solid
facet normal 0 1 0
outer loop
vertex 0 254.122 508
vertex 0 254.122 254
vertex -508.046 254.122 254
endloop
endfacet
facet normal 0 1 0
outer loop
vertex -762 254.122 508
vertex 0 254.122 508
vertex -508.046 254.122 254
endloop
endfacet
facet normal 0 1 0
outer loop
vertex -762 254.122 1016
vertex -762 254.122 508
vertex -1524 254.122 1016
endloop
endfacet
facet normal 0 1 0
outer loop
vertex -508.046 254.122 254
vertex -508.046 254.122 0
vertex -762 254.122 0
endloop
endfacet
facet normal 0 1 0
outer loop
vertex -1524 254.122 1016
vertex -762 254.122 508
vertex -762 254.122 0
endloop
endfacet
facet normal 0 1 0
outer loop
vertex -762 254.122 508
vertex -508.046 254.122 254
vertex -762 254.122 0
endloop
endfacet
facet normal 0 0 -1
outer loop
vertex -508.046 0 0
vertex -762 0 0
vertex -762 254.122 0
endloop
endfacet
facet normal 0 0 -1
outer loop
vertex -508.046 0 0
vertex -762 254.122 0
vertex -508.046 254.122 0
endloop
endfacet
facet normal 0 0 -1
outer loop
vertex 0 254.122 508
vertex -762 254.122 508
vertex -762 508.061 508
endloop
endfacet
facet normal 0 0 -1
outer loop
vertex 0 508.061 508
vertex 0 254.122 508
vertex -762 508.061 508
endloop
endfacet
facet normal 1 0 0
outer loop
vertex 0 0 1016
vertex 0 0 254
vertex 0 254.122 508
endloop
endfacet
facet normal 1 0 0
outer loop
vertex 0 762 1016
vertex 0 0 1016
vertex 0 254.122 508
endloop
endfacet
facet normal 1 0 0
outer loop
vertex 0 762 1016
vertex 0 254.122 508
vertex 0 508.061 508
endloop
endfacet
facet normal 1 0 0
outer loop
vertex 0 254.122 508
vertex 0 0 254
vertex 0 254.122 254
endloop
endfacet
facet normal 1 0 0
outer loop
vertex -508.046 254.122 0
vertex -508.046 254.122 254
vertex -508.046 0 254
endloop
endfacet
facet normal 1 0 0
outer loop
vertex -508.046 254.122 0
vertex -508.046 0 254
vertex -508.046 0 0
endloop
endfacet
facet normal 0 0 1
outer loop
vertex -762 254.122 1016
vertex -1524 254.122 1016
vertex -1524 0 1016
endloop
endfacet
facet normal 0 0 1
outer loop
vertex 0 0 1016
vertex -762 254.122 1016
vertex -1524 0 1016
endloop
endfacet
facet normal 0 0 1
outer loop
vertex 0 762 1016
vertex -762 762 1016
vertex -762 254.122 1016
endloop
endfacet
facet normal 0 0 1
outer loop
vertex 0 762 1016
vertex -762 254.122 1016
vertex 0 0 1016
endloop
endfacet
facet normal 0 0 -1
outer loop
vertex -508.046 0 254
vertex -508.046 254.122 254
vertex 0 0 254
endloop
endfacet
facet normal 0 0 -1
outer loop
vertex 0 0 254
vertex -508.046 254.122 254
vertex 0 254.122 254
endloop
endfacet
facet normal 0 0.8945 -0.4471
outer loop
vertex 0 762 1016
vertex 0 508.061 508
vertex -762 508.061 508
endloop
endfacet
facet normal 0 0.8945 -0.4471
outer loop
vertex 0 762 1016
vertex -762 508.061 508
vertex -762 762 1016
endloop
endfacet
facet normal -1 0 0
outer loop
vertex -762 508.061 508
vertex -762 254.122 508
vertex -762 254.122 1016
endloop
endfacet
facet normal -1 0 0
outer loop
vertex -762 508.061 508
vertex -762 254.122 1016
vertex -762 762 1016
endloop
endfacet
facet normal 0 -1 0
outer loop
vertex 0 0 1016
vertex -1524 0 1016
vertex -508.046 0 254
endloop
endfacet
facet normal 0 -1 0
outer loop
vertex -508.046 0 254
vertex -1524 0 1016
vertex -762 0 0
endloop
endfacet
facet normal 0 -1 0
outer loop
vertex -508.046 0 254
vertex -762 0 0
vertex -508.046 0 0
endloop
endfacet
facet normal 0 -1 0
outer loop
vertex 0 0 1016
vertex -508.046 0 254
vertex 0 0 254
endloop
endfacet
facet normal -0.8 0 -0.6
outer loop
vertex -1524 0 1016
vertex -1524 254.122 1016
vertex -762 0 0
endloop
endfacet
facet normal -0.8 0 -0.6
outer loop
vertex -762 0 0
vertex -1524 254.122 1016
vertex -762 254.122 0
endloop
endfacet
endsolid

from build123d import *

# Parameters (mm, degrees)
SKETCH1_W           = 1524
SKETCH1_H           = 762
BOSS_EXTRUDE1_DEPTH = 1016
SKETCH3_W           = 762
SKETCH3_H           = 507.878356785
CUT_EXTRUDE1_DEPTH  = 1016
CUT_EXTRUDE2_DEPTH  = 260.604
SKETCH6_W           = 254
SKETCH6_H           = 507.878356785
CUT_EXTRUDE3_DEPTH  = 1081.278
SKETCH7_W           = 254
SKETCH7_H           = 508
CUT_EXTRUDE4_DEPTH  = 1081.278
SKETCH8_W           = 508.045957887
SKETCH8_H           = 254
CUT_EXTRUDE5_DEPTH  = 1081.278
CUT_EXTRUDE6_DEPTH  = 835.406


with BuildPart() as part:
    # Sketch1 → Boss-Extrude1 (new body)
    with BuildSketch(Plane.XY):
        with Locations((-762, 381)):
            Rectangle(SKETCH1_W, SKETCH1_H)
    extrude(amount=BOSS_EXTRUDE1_DEPTH)

    # Sketch3 → Cut-Extrude1 (cut)
    with BuildSketch(Plane(origin=(0, 0, 0), x_dir=(-1, 0, 0), z_dir=(0, 0, -1))):
        with Locations((1143, 508.060821607)):
            Rectangle(SKETCH3_W, SKETCH3_H)
    extrude(amount=-CUT_EXTRUDE1_DEPTH, mode=Mode.SUBTRACT)

    # Sketch5 → Cut-Extrude2 (cut)
    with BuildSketch(Plane(origin=(0, 254.121643215, 0), x_dir=(1, 0, 0), z_dir=(0, 1, 0))):
        Polygon((-1524, -1016), (-762, 0), (-1524, 0), align=None)
    extrude(amount=-CUT_EXTRUDE2_DEPTH, mode=Mode.SUBTRACT)

    # Sketch6 → Cut-Extrude3 (cut)
    with BuildSketch(Plane.ZY.offset(762)):
        with Locations((127, 508.060821607)):
            Rectangle(SKETCH6_W, SKETCH6_H)
    extrude(amount=-CUT_EXTRUDE3_DEPTH, mode=Mode.SUBTRACT)

    # Sketch7 → Cut-Extrude4 (cut)
    with BuildSketch(Plane.ZY.offset(762)):
        with Locations((381, 508.121643215)):
            Rectangle(SKETCH7_W, SKETCH7_H)
    extrude(amount=-CUT_EXTRUDE4_DEPTH, mode=Mode.SUBTRACT)

    # Sketch8 → Cut-Extrude5 (cut)
    with BuildSketch(Plane(origin=(0, 254.121643215, 0), x_dir=(1, 0, 0), z_dir=(0, 1, 0))):
        with Locations((-254.022978944, -127)):
            Rectangle(SKETCH8_W, SKETCH8_H)
    extrude(amount=-CUT_EXTRUDE5_DEPTH, mode=Mode.SUBTRACT)

    # Sketch10 → Cut-Extrude6 (cut)
    with BuildSketch(Plane.ZY.offset(762)):
        Polygon((1016, 762), (508, 762), (508, 508.060821608), align=None)
    extrude(amount=-CUT_EXTRUDE6_DEPTH, mode=Mode.SUBTRACT)


solid = part.part
